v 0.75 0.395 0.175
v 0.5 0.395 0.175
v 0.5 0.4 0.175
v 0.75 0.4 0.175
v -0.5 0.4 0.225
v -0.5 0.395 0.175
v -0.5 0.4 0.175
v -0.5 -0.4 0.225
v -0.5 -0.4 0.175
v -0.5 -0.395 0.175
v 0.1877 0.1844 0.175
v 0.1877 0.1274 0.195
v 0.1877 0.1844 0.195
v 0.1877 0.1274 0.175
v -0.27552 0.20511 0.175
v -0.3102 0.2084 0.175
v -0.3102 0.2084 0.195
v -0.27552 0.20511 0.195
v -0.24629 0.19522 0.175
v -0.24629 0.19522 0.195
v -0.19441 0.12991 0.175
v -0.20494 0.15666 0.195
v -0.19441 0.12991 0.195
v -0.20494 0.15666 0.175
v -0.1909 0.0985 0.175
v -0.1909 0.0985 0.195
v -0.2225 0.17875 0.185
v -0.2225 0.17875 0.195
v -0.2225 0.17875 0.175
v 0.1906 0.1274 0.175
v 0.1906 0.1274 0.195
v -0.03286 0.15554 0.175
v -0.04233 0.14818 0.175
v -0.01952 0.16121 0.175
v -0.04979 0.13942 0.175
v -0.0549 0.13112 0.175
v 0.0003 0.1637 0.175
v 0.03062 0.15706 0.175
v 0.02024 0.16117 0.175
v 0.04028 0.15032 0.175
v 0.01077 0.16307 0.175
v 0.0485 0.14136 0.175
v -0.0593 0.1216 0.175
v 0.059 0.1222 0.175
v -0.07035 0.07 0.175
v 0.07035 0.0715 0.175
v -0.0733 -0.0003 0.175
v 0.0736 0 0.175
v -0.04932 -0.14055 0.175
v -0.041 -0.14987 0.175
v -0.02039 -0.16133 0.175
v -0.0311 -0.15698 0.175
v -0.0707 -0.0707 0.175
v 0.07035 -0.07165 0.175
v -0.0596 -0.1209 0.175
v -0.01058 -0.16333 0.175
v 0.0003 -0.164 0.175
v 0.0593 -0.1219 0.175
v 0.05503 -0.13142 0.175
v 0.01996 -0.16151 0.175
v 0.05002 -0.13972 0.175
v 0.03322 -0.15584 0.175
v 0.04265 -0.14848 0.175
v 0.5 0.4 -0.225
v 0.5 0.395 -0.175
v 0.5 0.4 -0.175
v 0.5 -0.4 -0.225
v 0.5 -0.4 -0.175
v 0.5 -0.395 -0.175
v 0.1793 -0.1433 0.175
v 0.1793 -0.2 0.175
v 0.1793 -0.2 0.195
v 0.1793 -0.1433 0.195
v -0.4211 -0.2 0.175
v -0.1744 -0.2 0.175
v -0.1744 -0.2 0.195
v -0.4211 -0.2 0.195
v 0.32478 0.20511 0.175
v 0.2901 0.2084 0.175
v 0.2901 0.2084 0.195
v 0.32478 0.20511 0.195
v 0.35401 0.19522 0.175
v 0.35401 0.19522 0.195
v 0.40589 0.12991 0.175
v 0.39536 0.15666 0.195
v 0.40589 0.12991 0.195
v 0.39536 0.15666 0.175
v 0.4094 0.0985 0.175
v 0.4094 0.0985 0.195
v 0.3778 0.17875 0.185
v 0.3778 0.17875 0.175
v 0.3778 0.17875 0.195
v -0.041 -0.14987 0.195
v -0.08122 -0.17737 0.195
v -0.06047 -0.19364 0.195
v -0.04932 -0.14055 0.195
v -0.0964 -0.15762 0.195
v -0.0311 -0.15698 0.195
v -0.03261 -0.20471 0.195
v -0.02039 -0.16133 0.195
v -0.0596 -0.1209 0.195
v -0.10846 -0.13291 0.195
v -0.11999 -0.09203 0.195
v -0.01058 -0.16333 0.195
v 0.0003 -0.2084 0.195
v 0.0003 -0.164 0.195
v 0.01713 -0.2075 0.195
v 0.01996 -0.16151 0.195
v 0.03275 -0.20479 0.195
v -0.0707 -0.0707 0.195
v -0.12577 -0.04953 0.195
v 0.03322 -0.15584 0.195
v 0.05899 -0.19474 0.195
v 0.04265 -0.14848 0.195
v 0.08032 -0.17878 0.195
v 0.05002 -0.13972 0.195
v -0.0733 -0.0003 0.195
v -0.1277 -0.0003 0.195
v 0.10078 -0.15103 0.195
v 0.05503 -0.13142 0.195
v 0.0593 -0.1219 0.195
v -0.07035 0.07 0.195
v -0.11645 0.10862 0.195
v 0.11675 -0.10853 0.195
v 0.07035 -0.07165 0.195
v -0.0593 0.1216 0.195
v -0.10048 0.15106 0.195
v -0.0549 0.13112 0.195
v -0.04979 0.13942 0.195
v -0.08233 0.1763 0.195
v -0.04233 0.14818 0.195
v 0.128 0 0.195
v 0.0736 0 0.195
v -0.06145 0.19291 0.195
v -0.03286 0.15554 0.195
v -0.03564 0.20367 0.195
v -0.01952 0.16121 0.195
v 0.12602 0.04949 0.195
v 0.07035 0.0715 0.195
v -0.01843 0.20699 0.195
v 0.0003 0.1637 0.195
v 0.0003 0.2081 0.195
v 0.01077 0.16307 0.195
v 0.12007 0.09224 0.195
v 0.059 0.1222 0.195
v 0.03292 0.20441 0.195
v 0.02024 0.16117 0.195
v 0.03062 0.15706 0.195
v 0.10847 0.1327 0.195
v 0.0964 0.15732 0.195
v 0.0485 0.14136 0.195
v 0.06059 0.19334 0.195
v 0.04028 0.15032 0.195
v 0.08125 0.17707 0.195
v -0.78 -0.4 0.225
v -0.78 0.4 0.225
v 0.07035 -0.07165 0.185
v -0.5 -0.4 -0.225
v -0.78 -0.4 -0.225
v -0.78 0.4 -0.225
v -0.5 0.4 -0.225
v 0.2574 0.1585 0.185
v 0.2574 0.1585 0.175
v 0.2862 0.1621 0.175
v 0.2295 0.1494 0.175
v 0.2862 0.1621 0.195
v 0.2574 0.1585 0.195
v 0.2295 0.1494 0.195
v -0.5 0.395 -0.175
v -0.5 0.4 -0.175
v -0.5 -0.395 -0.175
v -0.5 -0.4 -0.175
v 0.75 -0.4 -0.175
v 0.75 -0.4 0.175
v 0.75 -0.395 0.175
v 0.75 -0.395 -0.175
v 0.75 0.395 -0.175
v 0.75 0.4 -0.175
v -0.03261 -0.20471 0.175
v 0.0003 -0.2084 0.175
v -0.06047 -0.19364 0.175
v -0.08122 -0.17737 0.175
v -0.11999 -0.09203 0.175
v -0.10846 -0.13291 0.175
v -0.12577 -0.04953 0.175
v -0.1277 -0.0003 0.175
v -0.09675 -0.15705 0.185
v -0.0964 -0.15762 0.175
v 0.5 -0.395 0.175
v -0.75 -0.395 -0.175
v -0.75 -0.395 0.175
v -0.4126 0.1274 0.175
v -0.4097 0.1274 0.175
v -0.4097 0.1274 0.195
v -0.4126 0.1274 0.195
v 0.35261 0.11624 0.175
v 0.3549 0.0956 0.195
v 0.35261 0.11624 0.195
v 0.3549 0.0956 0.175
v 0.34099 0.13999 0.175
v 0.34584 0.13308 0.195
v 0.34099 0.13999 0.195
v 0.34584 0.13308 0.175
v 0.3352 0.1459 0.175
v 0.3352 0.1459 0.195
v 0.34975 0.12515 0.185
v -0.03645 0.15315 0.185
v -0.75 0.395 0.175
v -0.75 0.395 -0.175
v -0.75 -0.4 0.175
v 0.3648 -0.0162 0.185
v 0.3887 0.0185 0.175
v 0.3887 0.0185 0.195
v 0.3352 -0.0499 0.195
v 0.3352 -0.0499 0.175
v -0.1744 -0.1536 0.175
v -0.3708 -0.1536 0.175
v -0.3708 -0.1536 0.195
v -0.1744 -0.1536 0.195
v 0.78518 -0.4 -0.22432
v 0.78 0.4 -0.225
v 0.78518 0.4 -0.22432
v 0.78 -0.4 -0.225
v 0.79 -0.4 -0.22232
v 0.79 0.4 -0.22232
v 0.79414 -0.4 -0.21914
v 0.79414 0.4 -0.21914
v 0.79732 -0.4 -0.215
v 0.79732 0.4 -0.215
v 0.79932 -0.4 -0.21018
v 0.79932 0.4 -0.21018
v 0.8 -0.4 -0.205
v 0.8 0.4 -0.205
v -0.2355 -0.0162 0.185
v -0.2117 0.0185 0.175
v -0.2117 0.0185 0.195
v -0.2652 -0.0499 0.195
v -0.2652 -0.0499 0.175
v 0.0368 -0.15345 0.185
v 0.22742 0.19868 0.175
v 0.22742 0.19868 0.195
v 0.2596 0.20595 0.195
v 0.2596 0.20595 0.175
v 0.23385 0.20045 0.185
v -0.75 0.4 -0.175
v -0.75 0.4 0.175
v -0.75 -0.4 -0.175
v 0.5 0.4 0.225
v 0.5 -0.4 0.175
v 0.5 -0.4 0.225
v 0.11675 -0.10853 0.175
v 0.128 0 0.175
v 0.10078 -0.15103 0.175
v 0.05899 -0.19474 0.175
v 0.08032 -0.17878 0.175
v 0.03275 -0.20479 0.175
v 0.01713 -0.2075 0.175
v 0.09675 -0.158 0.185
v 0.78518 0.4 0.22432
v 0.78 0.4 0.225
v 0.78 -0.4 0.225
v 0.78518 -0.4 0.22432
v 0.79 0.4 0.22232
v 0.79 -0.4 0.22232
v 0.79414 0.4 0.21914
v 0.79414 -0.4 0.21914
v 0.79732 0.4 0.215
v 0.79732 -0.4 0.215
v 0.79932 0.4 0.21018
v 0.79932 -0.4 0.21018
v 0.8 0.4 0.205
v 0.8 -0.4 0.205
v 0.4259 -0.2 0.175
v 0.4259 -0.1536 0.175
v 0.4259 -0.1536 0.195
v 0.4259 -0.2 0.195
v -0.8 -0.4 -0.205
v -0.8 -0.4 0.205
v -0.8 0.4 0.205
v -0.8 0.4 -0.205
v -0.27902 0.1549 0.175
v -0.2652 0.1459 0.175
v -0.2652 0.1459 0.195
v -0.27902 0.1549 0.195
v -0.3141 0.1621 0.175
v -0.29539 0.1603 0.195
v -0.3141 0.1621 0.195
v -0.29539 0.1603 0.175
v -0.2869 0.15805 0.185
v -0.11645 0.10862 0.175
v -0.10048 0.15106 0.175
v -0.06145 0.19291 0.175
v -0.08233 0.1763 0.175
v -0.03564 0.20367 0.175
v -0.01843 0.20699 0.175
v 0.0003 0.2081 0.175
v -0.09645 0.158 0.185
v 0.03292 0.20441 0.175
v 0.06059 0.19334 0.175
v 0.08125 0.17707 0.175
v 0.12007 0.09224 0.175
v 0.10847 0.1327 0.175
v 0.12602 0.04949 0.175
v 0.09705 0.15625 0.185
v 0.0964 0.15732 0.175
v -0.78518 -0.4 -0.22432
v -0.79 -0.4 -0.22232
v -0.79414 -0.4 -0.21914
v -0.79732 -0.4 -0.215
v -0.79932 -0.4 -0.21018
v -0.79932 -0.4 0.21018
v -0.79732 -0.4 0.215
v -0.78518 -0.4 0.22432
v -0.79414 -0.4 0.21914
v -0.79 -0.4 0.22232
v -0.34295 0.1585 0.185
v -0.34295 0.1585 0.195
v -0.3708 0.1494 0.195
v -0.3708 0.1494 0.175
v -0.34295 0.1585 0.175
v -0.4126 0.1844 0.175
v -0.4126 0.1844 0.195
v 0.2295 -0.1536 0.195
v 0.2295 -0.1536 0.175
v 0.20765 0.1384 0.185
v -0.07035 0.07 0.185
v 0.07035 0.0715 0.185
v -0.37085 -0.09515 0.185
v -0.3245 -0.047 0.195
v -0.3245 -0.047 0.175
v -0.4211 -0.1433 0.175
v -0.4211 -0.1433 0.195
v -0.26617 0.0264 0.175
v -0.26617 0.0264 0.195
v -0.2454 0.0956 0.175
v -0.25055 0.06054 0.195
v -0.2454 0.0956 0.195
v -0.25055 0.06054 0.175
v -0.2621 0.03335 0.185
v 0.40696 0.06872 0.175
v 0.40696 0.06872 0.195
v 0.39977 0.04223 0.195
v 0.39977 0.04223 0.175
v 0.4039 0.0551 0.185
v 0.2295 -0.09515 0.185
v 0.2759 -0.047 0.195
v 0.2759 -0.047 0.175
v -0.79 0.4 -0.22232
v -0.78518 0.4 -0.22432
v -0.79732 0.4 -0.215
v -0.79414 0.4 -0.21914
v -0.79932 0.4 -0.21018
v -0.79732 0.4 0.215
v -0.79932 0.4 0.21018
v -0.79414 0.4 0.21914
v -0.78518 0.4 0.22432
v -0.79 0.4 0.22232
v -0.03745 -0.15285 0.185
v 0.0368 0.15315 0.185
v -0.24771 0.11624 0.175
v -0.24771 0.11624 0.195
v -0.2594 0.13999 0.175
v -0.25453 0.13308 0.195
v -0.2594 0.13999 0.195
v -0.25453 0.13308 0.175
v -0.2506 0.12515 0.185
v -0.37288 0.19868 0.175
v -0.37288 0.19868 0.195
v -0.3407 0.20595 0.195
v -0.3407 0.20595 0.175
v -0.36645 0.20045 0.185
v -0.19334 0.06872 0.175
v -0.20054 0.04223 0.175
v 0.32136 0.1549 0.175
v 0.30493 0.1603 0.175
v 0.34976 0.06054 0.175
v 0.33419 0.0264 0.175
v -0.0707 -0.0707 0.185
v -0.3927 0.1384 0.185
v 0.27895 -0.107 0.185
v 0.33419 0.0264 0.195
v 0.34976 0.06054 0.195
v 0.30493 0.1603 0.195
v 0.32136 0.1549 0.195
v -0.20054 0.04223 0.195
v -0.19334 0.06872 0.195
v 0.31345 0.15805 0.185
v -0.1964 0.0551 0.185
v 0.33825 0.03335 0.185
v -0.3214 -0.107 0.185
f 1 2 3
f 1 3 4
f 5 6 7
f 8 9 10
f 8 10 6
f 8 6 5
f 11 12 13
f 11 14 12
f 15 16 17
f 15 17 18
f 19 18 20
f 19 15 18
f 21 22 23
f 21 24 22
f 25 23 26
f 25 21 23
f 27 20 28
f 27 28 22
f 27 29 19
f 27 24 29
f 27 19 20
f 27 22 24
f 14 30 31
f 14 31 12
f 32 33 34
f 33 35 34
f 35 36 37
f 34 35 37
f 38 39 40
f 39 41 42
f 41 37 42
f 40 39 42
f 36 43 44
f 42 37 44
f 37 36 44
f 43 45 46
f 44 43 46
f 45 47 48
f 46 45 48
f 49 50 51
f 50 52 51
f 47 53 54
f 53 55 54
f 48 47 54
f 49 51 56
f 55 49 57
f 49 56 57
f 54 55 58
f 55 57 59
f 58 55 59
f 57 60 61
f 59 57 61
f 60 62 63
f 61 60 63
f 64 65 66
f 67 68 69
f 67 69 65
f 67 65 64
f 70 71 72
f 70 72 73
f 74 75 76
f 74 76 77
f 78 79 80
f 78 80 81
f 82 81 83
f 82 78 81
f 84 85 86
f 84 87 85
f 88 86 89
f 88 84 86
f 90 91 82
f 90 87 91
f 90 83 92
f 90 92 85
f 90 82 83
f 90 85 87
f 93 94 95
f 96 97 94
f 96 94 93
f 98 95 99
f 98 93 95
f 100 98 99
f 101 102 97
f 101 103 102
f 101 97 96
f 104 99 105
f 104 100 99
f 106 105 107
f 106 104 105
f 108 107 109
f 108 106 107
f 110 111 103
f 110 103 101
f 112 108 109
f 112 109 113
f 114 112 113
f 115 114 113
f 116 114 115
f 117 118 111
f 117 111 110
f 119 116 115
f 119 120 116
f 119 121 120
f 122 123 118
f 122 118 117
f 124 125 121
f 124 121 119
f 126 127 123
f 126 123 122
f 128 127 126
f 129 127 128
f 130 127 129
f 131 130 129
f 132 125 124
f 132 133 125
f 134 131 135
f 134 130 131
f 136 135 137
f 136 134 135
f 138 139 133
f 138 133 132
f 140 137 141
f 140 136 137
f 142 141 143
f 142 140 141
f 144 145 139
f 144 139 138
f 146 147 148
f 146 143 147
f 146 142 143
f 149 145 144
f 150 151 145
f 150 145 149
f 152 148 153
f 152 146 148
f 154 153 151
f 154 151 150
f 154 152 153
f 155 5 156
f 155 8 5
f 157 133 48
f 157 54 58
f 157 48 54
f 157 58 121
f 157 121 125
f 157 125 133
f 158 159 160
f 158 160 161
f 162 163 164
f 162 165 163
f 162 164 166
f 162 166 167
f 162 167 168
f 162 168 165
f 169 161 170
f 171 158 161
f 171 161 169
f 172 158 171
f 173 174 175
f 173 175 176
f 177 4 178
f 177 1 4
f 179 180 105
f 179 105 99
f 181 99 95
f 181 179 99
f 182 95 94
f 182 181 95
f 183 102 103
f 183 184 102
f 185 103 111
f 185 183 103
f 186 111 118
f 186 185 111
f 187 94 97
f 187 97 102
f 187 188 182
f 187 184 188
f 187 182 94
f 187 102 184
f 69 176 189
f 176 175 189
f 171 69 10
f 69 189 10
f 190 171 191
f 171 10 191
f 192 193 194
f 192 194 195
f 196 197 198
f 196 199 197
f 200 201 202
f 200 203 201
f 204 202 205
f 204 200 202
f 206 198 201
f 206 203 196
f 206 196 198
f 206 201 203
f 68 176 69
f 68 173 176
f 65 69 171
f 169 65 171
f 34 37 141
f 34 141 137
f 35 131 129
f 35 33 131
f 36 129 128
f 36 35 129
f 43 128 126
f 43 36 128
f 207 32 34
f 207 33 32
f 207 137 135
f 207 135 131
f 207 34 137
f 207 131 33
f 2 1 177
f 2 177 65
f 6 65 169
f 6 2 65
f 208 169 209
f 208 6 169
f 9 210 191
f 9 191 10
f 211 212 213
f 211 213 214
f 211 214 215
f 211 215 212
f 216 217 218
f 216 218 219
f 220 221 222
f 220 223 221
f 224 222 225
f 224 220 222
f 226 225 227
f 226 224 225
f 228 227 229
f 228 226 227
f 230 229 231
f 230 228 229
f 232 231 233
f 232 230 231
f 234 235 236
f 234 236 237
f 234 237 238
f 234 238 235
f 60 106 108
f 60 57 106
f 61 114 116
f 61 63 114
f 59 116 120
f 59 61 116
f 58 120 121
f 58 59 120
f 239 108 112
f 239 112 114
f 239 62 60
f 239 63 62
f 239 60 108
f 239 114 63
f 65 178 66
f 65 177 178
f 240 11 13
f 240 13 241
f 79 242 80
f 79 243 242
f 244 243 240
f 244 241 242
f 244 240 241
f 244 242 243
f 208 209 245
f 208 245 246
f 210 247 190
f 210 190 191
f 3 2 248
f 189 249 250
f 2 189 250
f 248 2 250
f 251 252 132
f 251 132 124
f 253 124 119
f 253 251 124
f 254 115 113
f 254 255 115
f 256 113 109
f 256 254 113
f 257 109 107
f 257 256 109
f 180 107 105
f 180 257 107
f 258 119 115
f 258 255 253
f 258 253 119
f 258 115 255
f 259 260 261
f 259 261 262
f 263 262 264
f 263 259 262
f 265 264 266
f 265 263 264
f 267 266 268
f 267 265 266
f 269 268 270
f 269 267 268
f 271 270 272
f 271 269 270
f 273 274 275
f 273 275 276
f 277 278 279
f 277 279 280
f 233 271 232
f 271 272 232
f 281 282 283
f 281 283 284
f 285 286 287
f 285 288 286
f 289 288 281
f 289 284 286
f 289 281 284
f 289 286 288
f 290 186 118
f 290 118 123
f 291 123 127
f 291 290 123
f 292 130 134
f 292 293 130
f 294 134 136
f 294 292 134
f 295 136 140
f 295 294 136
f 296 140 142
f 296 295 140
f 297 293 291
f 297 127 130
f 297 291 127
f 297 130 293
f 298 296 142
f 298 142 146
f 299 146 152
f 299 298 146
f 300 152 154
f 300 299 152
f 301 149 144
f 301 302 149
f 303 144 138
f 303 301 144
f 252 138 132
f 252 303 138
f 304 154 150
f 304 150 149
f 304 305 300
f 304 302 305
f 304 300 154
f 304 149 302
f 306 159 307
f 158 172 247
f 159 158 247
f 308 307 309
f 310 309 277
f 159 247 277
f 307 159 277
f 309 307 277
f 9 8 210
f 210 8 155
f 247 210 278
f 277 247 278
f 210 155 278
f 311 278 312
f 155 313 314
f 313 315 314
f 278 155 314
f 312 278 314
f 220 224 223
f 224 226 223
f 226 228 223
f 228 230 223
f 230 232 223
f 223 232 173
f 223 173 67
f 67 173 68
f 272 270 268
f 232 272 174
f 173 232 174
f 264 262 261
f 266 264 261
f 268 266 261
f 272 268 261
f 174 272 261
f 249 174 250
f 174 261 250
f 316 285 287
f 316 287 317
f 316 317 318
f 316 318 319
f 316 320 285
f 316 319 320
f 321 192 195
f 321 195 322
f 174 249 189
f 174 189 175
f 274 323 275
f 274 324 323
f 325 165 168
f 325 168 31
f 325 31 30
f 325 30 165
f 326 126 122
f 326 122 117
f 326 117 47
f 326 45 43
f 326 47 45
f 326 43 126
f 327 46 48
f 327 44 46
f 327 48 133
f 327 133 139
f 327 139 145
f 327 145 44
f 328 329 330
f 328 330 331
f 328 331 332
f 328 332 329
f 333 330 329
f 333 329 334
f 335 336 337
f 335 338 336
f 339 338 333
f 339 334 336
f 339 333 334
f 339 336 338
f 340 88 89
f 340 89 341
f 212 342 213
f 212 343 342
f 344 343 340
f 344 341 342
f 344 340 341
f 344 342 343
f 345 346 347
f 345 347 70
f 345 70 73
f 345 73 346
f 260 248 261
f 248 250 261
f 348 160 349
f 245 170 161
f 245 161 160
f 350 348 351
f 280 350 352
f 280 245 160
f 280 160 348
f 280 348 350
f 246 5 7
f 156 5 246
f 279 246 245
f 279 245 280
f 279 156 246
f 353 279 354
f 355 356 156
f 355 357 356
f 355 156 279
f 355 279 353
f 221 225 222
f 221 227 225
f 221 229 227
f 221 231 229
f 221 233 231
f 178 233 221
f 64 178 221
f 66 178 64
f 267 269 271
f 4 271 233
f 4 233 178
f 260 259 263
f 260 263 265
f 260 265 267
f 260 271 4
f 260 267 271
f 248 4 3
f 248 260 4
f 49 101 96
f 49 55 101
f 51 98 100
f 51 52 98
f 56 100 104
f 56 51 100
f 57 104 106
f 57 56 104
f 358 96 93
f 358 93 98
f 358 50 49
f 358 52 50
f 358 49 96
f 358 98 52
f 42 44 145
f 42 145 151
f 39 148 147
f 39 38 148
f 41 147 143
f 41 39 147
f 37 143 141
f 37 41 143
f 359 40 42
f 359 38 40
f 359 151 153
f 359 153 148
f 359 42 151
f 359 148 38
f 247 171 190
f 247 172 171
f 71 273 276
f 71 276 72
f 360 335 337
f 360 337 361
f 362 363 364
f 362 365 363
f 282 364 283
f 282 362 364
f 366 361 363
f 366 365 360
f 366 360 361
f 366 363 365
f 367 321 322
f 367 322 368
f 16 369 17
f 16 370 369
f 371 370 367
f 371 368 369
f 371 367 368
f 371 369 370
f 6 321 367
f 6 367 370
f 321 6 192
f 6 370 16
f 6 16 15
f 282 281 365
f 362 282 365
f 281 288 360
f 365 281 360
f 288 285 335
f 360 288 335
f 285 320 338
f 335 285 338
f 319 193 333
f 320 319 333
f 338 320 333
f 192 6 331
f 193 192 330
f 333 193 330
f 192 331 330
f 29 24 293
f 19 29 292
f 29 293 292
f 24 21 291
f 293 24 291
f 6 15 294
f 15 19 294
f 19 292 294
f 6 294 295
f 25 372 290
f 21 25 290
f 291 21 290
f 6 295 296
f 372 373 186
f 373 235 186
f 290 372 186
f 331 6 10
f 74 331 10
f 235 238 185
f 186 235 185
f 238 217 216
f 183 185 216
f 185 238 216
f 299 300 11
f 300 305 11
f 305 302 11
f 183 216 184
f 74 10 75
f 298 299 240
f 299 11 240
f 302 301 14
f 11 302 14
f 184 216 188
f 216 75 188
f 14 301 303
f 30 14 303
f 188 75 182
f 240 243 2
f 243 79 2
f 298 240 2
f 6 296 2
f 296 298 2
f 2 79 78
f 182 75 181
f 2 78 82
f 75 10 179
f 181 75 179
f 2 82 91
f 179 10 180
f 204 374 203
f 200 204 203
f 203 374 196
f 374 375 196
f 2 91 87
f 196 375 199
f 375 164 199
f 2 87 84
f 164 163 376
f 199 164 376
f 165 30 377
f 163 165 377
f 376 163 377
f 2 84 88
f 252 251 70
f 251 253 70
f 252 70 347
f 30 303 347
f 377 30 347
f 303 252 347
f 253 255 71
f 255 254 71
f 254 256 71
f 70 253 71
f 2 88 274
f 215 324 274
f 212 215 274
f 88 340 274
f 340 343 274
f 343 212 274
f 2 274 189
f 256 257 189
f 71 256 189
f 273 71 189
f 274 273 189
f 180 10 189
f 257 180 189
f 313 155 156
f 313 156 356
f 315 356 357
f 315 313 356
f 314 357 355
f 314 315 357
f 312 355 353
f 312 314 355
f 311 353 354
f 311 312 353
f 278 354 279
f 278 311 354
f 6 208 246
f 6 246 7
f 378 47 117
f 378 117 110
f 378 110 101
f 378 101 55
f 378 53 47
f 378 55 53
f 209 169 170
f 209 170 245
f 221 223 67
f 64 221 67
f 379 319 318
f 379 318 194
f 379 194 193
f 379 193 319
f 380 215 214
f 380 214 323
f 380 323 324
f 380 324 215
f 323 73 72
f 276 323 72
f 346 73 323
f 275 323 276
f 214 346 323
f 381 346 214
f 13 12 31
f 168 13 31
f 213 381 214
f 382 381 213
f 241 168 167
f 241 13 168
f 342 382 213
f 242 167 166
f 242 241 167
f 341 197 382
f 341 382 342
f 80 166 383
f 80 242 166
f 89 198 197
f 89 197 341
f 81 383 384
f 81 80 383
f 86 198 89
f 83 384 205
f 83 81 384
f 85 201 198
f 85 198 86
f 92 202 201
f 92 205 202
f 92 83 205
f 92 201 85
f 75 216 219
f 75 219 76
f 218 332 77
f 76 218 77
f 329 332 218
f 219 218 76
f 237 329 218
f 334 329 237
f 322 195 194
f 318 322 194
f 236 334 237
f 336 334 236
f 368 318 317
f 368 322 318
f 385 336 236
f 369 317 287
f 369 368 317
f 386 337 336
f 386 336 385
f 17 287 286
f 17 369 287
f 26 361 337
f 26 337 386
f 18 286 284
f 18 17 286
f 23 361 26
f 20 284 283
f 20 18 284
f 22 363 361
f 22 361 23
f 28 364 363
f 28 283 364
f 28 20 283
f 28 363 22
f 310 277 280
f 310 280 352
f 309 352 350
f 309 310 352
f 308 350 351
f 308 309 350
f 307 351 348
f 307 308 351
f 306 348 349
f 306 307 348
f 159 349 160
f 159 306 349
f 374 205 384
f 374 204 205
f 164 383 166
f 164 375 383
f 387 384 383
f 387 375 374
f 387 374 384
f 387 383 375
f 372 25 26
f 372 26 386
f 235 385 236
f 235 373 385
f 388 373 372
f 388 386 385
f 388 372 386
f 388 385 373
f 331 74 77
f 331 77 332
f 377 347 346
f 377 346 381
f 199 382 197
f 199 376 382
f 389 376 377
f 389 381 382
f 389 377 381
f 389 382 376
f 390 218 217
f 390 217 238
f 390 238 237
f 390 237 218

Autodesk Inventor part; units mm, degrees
ref_plane "YZ Plane" through (0, 0, 0) normal (1, 0, 0) x (0, 1, 0)
ref_plane "XZ Plane" through (0, 0, 0) normal (0, 1, 0) x (-1, 0, 0)
ref_plane "XY Plane" through (0, 0, 0) normal (0, 0, 1) x (1, 0, 0)
sketch "Sketch1" plane through (0, 0, 0) normal (0, 1, 0) x (-1, 0, 0)
  line L0 (0.75, 0.175) -> (-0.75, 0.175)
  line L1 (-0.75, 0.175) -> (-0.75, -0.175)
  line L2 (-0.75, -0.175) -> (0.75, -0.175)
  line L3 (0.75, -0.175) -> (0.75, 0.175)
  line L4 (0.5, 0.175) -> (0.5, 0.225)
  line L5 (0.5, 0.225) -> (0.8, 0.225)
  line L6 (0.8, 0.225) -> (0.8, -0.225)
  line L7 (0.8, -0.225) -> (0.5, -0.225)
  line L8 (0.5, -0.225) -> (0.5, -0.175)
  line L9 (-0.5, 0.175) -> (-0.5, 0.225)
  line L10 (-0.5, 0.225) -> (-0.8, 0.225)
  line L11 (-0.8, 0.225) -> (-0.8, -0.225)
  line L12 (-0.8, -0.225) -> (-0.5, -0.225)
  line L13 (-0.5, -0.175) -> (-0.5, -0.225)
  line L14 (0.5, 0.175) -> (-0.5, 0.175)
  point P0 (0, 0)
  point P1 (0, 0.175)
  point P2 (0.75, 0)
  dimension "d0" = 1.6
  dimension "d1" = 0.05
  dimension "d2" = 0.05
  dimension "d3" = 0.45
  dimension "d4" = 0.3
extrude "Extrusion1" add sketch "Sketch1" along normal mid plane 0.8 contours L0 L4 L5 L6 L7 L8 L2 L3 | L0 L1 L2 L13 L12 L11 L10 L9
extrude "Extrusion2" add sketch "Sketch1" along normal mid plane 0.79 contours L3 L2 L1 L0
sketch "Sketch2" plane through (-0.5, -0.395, 0.175) normal (0, 0, 1) x (1, 0, 0)
  line L0 (0, 0) -> (0, 0.79) projected
  line L1 (1, 0) -> (0, 0) projected
  line L2 (1, 0) -> (1, 0.79) projected
  line L3 (0, 0.79) -> (1, 0.79) projected
  line L4 (0, 0.395) -> (1, 0.395) construction
  line L5 (0.3256, 0.195) -> (0.0789, 0.195)
  line L6 (0.0789, 0.195) -> (0.0789, 0.2517)
  spline S0 degree 2 poles (0.0789, 0.2517) (0.1055, 0.2767) (0.1528, 0.323) (0.1755, 0.348) knots 0 0 0 1 2 2 2
  spline S1 degree 2 poles (0.1755, 0.348) (0.2212, 0.3982) (0.2546, 0.4585) (0.2546, 0.4906) knots 0 0 0 1 2 2 2
  spline S2 degree 2 poles (0.2546, 0.4906) (0.2546, 0.5075) (0.2442, 0.5328) (0.2348, 0.5409) knots 0 0 0 1 2 2 2
  spline S3 degree 2 poles (0.2348, 0.5409) (0.2254, 0.549) (0.2008, 0.5571) (0.1859, 0.5571) knots 0 0 0 1 2 2 2
  spline S4 degree 2 poles (0.1859, 0.5571) (0.1716, 0.5571) (0.1425, 0.5499) (0.1292, 0.5444) knots 0 0 0 1 2 2 2
  spline S5 degree 2 poles (0.1292, 0.5444) (0.1178, 0.5399) (0.0968, 0.5269) (0.0903, 0.5224) knots 0 0 0 1 2 2 2
  line L7 (0.0903, 0.5224) -> (0.0874, 0.5224)
  line L8 (0.0874, 0.5224) -> (0.0874, 0.5794)
  spline S6 degree 2 poles (0.0874, 0.5794) (0.1039, 0.5875) (0.1632, 0.6034) (0.1898, 0.6034) knots 0 0 0 1 2 2 2
  spline S7 degree 2 poles (0.1898, 0.6034) (0.2459, 0.6034) (0.3091, 0.5441) (0.3091, 0.4935) knots 0 0 0 1 2 2 2
  spline S8 degree 2 poles (0.3091, 0.4935) (0.3091, 0.4699) (0.2981, 0.4303) (0.2883, 0.4135) knots 0 0 0 1 2 2 2
  spline S9 degree 2 poles (0.2883, 0.4135) (0.2786, 0.396) (0.2504, 0.3616) (0.2348, 0.3451) knots 0 0 0 1 2 2 2
  spline S10 degree 2 poles (0.2348, 0.3451) (0.2096, 0.3175) (0.1476, 0.2585) (0.1292, 0.2414) knots 0 0 0 1 2 2 2
  line L9 (0.1292, 0.2414) -> (0.3256, 0.2414)
  line L10 (0.3256, 0.2414) -> (0.3256, 0.195)
  spline S11 degree 2 poles (0.628, 0.395) (0.628, 0.2874) (0.5655, 0.1866) (0.5003, 0.1866) knots 0 0 0 1 2 2 2
  spline S12 degree 2 poles (0.5003, 0.1866) (0.4342, 0.1866) (0.3723, 0.2893) (0.3723, 0.3947) knots 0 0 0 1 2 2 2
  spline S13 degree 2 poles (0.3723, 0.3947) (0.3723, 0.5029) (0.4348, 0.6031) (0.5003, 0.6031) knots 0 0 0 1 2 2 2
  spline S14 degree 2 poles (0.5003, 0.6031) (0.5661, 0.6031) (0.628, 0.4994) (0.628, 0.395) knots 0 0 0 1 2 2 2
  spline S15 degree 2 poles (0.5593, 0.2731) (0.5671, 0.2929) (0.5736, 0.3538) (0.5736, 0.395) knots 0 0 0 1 2 2 2
  spline S16 degree 2 poles (0.5736, 0.395) (0.5736, 0.4362) (0.5671, 0.4968) (0.559, 0.5172) knots 0 0 0 1 2 2 2
  spline S17 degree 2 poles (0.559, 0.5172) (0.5509, 0.5376) (0.5227, 0.5587) (0.5003, 0.5587) knots 0 0 0 1 2 2 2
  spline S18 degree 2 poles (0.5003, 0.5587) (0.478, 0.5587) (0.4491, 0.5376) (0.4407, 0.5166) knots 0 0 0 1 2 2 2
  spline S19 degree 2 poles (0.4407, 0.5166) (0.4326, 0.4961) (0.4267, 0.4339) (0.4267, 0.3947) knots 0 0 0 1 2 2 2
  spline S20 degree 2 poles (0.4267, 0.3947) (0.4267, 0.3525) (0.4319, 0.2961) (0.4404, 0.2741) knots 0 0 0 1 2 2 2
  spline S21 degree 2 poles (0.4404, 0.2741) (0.4481, 0.2533) (0.477, 0.231) (0.5003, 0.231) knots 0 0 0 1 2 2 2
  spline S22 degree 2 poles (0.5003, 0.231) (0.5224, 0.231) (0.5512, 0.2521) (0.5593, 0.2731) knots 0 0 0 1 2 2 2
  line L11 (0.9259, 0.195) -> (0.6793, 0.195)
  line L12 (0.6793, 0.195) -> (0.6793, 0.2517)
  spline S23 degree 2 poles (0.6793, 0.2517) (0.7058, 0.2767) (0.7532, 0.323) (0.7759, 0.348) knots 0 0 0 1 2 2 2
  spline S24 degree 2 poles (0.7759, 0.348) (0.8216, 0.3982) (0.8549, 0.4585) (0.8549, 0.4906) knots 0 0 0 1 2 2 2
  spline S25 degree 2 poles (0.8549, 0.4906) (0.8549, 0.5075) (0.8446, 0.5328) (0.8352, 0.5409) knots 0 0 0 1 2 2 2
  spline S26 degree 2 poles (0.8352, 0.5409) (0.8258, 0.549) (0.8011, 0.5571) (0.7862, 0.5571) knots 0 0 0 1 2 2 2
  spline S27 degree 2 poles (0.7862, 0.5571) (0.772, 0.5571) (0.7428, 0.5499) (0.7295, 0.5444) knots 0 0 0 1 2 2 2
  spline S28 degree 2 poles (0.7295, 0.5444) (0.7182, 0.5399) (0.6971, 0.5269) (0.6906, 0.5224) knots 0 0 0 1 2 2 2
  line L13 (0.6906, 0.5224) -> (0.6877, 0.5224)
  line L14 (0.6877, 0.5224) -> (0.6877, 0.5794)
  spline S29 degree 2 poles (0.6877, 0.5794) (0.7042, 0.5875) (0.7635, 0.6034) (0.7901, 0.6034) knots 0 0 0 1 2 2 2
  spline S30 degree 2 poles (0.7901, 0.6034) (0.8462, 0.6034) (0.9094, 0.5441) (0.9094, 0.4935) knots 0 0 0 1 2 2 2
  spline S31 degree 2 poles (0.9094, 0.4935) (0.9094, 0.4699) (0.8984, 0.4303) (0.8887, 0.4135) knots 0 0 0 1 2 2 2
  spline S32 degree 2 poles (0.8887, 0.4135) (0.8789, 0.396) (0.8507, 0.3616) (0.8352, 0.3451) knots 0 0 0 1 2 2 2
  spline S33 degree 2 poles (0.8352, 0.3451) (0.8099, 0.3175) (0.748, 0.2585) (0.7295, 0.2414) knots 0 0 0 1 2 2 2
  line L15 (0.7295, 0.2414) -> (0.9259, 0.2414)
  line L16 (0.9259, 0.2414) -> (0.9259, 0.195)
  point P0 (0.5, 0.395)
extrude "Extrusion3" add sketch "Sketch2" along normal blind 0.02 contours L5 L6 S0 S1 S2 S3 S4 S5 L7 L8 S6 S7 S8 S9 S10 L9 L10 | S11 S12 S13 S14 | L11 L12 S23 S24 S25 S26 S27 S28 L13 L14 S29 S30 S31 S32 S33 L15 L16
fillet "Fillet1" radius 0.02 4 edges at (-0.8, 0, 0.225) (-0.8, 0, -0.225) (0.8, 0, 0.225) (0.8, 0, -0.225)
equation "\"d2\" = d1"
properties part number "21-1001" material "Copper"
